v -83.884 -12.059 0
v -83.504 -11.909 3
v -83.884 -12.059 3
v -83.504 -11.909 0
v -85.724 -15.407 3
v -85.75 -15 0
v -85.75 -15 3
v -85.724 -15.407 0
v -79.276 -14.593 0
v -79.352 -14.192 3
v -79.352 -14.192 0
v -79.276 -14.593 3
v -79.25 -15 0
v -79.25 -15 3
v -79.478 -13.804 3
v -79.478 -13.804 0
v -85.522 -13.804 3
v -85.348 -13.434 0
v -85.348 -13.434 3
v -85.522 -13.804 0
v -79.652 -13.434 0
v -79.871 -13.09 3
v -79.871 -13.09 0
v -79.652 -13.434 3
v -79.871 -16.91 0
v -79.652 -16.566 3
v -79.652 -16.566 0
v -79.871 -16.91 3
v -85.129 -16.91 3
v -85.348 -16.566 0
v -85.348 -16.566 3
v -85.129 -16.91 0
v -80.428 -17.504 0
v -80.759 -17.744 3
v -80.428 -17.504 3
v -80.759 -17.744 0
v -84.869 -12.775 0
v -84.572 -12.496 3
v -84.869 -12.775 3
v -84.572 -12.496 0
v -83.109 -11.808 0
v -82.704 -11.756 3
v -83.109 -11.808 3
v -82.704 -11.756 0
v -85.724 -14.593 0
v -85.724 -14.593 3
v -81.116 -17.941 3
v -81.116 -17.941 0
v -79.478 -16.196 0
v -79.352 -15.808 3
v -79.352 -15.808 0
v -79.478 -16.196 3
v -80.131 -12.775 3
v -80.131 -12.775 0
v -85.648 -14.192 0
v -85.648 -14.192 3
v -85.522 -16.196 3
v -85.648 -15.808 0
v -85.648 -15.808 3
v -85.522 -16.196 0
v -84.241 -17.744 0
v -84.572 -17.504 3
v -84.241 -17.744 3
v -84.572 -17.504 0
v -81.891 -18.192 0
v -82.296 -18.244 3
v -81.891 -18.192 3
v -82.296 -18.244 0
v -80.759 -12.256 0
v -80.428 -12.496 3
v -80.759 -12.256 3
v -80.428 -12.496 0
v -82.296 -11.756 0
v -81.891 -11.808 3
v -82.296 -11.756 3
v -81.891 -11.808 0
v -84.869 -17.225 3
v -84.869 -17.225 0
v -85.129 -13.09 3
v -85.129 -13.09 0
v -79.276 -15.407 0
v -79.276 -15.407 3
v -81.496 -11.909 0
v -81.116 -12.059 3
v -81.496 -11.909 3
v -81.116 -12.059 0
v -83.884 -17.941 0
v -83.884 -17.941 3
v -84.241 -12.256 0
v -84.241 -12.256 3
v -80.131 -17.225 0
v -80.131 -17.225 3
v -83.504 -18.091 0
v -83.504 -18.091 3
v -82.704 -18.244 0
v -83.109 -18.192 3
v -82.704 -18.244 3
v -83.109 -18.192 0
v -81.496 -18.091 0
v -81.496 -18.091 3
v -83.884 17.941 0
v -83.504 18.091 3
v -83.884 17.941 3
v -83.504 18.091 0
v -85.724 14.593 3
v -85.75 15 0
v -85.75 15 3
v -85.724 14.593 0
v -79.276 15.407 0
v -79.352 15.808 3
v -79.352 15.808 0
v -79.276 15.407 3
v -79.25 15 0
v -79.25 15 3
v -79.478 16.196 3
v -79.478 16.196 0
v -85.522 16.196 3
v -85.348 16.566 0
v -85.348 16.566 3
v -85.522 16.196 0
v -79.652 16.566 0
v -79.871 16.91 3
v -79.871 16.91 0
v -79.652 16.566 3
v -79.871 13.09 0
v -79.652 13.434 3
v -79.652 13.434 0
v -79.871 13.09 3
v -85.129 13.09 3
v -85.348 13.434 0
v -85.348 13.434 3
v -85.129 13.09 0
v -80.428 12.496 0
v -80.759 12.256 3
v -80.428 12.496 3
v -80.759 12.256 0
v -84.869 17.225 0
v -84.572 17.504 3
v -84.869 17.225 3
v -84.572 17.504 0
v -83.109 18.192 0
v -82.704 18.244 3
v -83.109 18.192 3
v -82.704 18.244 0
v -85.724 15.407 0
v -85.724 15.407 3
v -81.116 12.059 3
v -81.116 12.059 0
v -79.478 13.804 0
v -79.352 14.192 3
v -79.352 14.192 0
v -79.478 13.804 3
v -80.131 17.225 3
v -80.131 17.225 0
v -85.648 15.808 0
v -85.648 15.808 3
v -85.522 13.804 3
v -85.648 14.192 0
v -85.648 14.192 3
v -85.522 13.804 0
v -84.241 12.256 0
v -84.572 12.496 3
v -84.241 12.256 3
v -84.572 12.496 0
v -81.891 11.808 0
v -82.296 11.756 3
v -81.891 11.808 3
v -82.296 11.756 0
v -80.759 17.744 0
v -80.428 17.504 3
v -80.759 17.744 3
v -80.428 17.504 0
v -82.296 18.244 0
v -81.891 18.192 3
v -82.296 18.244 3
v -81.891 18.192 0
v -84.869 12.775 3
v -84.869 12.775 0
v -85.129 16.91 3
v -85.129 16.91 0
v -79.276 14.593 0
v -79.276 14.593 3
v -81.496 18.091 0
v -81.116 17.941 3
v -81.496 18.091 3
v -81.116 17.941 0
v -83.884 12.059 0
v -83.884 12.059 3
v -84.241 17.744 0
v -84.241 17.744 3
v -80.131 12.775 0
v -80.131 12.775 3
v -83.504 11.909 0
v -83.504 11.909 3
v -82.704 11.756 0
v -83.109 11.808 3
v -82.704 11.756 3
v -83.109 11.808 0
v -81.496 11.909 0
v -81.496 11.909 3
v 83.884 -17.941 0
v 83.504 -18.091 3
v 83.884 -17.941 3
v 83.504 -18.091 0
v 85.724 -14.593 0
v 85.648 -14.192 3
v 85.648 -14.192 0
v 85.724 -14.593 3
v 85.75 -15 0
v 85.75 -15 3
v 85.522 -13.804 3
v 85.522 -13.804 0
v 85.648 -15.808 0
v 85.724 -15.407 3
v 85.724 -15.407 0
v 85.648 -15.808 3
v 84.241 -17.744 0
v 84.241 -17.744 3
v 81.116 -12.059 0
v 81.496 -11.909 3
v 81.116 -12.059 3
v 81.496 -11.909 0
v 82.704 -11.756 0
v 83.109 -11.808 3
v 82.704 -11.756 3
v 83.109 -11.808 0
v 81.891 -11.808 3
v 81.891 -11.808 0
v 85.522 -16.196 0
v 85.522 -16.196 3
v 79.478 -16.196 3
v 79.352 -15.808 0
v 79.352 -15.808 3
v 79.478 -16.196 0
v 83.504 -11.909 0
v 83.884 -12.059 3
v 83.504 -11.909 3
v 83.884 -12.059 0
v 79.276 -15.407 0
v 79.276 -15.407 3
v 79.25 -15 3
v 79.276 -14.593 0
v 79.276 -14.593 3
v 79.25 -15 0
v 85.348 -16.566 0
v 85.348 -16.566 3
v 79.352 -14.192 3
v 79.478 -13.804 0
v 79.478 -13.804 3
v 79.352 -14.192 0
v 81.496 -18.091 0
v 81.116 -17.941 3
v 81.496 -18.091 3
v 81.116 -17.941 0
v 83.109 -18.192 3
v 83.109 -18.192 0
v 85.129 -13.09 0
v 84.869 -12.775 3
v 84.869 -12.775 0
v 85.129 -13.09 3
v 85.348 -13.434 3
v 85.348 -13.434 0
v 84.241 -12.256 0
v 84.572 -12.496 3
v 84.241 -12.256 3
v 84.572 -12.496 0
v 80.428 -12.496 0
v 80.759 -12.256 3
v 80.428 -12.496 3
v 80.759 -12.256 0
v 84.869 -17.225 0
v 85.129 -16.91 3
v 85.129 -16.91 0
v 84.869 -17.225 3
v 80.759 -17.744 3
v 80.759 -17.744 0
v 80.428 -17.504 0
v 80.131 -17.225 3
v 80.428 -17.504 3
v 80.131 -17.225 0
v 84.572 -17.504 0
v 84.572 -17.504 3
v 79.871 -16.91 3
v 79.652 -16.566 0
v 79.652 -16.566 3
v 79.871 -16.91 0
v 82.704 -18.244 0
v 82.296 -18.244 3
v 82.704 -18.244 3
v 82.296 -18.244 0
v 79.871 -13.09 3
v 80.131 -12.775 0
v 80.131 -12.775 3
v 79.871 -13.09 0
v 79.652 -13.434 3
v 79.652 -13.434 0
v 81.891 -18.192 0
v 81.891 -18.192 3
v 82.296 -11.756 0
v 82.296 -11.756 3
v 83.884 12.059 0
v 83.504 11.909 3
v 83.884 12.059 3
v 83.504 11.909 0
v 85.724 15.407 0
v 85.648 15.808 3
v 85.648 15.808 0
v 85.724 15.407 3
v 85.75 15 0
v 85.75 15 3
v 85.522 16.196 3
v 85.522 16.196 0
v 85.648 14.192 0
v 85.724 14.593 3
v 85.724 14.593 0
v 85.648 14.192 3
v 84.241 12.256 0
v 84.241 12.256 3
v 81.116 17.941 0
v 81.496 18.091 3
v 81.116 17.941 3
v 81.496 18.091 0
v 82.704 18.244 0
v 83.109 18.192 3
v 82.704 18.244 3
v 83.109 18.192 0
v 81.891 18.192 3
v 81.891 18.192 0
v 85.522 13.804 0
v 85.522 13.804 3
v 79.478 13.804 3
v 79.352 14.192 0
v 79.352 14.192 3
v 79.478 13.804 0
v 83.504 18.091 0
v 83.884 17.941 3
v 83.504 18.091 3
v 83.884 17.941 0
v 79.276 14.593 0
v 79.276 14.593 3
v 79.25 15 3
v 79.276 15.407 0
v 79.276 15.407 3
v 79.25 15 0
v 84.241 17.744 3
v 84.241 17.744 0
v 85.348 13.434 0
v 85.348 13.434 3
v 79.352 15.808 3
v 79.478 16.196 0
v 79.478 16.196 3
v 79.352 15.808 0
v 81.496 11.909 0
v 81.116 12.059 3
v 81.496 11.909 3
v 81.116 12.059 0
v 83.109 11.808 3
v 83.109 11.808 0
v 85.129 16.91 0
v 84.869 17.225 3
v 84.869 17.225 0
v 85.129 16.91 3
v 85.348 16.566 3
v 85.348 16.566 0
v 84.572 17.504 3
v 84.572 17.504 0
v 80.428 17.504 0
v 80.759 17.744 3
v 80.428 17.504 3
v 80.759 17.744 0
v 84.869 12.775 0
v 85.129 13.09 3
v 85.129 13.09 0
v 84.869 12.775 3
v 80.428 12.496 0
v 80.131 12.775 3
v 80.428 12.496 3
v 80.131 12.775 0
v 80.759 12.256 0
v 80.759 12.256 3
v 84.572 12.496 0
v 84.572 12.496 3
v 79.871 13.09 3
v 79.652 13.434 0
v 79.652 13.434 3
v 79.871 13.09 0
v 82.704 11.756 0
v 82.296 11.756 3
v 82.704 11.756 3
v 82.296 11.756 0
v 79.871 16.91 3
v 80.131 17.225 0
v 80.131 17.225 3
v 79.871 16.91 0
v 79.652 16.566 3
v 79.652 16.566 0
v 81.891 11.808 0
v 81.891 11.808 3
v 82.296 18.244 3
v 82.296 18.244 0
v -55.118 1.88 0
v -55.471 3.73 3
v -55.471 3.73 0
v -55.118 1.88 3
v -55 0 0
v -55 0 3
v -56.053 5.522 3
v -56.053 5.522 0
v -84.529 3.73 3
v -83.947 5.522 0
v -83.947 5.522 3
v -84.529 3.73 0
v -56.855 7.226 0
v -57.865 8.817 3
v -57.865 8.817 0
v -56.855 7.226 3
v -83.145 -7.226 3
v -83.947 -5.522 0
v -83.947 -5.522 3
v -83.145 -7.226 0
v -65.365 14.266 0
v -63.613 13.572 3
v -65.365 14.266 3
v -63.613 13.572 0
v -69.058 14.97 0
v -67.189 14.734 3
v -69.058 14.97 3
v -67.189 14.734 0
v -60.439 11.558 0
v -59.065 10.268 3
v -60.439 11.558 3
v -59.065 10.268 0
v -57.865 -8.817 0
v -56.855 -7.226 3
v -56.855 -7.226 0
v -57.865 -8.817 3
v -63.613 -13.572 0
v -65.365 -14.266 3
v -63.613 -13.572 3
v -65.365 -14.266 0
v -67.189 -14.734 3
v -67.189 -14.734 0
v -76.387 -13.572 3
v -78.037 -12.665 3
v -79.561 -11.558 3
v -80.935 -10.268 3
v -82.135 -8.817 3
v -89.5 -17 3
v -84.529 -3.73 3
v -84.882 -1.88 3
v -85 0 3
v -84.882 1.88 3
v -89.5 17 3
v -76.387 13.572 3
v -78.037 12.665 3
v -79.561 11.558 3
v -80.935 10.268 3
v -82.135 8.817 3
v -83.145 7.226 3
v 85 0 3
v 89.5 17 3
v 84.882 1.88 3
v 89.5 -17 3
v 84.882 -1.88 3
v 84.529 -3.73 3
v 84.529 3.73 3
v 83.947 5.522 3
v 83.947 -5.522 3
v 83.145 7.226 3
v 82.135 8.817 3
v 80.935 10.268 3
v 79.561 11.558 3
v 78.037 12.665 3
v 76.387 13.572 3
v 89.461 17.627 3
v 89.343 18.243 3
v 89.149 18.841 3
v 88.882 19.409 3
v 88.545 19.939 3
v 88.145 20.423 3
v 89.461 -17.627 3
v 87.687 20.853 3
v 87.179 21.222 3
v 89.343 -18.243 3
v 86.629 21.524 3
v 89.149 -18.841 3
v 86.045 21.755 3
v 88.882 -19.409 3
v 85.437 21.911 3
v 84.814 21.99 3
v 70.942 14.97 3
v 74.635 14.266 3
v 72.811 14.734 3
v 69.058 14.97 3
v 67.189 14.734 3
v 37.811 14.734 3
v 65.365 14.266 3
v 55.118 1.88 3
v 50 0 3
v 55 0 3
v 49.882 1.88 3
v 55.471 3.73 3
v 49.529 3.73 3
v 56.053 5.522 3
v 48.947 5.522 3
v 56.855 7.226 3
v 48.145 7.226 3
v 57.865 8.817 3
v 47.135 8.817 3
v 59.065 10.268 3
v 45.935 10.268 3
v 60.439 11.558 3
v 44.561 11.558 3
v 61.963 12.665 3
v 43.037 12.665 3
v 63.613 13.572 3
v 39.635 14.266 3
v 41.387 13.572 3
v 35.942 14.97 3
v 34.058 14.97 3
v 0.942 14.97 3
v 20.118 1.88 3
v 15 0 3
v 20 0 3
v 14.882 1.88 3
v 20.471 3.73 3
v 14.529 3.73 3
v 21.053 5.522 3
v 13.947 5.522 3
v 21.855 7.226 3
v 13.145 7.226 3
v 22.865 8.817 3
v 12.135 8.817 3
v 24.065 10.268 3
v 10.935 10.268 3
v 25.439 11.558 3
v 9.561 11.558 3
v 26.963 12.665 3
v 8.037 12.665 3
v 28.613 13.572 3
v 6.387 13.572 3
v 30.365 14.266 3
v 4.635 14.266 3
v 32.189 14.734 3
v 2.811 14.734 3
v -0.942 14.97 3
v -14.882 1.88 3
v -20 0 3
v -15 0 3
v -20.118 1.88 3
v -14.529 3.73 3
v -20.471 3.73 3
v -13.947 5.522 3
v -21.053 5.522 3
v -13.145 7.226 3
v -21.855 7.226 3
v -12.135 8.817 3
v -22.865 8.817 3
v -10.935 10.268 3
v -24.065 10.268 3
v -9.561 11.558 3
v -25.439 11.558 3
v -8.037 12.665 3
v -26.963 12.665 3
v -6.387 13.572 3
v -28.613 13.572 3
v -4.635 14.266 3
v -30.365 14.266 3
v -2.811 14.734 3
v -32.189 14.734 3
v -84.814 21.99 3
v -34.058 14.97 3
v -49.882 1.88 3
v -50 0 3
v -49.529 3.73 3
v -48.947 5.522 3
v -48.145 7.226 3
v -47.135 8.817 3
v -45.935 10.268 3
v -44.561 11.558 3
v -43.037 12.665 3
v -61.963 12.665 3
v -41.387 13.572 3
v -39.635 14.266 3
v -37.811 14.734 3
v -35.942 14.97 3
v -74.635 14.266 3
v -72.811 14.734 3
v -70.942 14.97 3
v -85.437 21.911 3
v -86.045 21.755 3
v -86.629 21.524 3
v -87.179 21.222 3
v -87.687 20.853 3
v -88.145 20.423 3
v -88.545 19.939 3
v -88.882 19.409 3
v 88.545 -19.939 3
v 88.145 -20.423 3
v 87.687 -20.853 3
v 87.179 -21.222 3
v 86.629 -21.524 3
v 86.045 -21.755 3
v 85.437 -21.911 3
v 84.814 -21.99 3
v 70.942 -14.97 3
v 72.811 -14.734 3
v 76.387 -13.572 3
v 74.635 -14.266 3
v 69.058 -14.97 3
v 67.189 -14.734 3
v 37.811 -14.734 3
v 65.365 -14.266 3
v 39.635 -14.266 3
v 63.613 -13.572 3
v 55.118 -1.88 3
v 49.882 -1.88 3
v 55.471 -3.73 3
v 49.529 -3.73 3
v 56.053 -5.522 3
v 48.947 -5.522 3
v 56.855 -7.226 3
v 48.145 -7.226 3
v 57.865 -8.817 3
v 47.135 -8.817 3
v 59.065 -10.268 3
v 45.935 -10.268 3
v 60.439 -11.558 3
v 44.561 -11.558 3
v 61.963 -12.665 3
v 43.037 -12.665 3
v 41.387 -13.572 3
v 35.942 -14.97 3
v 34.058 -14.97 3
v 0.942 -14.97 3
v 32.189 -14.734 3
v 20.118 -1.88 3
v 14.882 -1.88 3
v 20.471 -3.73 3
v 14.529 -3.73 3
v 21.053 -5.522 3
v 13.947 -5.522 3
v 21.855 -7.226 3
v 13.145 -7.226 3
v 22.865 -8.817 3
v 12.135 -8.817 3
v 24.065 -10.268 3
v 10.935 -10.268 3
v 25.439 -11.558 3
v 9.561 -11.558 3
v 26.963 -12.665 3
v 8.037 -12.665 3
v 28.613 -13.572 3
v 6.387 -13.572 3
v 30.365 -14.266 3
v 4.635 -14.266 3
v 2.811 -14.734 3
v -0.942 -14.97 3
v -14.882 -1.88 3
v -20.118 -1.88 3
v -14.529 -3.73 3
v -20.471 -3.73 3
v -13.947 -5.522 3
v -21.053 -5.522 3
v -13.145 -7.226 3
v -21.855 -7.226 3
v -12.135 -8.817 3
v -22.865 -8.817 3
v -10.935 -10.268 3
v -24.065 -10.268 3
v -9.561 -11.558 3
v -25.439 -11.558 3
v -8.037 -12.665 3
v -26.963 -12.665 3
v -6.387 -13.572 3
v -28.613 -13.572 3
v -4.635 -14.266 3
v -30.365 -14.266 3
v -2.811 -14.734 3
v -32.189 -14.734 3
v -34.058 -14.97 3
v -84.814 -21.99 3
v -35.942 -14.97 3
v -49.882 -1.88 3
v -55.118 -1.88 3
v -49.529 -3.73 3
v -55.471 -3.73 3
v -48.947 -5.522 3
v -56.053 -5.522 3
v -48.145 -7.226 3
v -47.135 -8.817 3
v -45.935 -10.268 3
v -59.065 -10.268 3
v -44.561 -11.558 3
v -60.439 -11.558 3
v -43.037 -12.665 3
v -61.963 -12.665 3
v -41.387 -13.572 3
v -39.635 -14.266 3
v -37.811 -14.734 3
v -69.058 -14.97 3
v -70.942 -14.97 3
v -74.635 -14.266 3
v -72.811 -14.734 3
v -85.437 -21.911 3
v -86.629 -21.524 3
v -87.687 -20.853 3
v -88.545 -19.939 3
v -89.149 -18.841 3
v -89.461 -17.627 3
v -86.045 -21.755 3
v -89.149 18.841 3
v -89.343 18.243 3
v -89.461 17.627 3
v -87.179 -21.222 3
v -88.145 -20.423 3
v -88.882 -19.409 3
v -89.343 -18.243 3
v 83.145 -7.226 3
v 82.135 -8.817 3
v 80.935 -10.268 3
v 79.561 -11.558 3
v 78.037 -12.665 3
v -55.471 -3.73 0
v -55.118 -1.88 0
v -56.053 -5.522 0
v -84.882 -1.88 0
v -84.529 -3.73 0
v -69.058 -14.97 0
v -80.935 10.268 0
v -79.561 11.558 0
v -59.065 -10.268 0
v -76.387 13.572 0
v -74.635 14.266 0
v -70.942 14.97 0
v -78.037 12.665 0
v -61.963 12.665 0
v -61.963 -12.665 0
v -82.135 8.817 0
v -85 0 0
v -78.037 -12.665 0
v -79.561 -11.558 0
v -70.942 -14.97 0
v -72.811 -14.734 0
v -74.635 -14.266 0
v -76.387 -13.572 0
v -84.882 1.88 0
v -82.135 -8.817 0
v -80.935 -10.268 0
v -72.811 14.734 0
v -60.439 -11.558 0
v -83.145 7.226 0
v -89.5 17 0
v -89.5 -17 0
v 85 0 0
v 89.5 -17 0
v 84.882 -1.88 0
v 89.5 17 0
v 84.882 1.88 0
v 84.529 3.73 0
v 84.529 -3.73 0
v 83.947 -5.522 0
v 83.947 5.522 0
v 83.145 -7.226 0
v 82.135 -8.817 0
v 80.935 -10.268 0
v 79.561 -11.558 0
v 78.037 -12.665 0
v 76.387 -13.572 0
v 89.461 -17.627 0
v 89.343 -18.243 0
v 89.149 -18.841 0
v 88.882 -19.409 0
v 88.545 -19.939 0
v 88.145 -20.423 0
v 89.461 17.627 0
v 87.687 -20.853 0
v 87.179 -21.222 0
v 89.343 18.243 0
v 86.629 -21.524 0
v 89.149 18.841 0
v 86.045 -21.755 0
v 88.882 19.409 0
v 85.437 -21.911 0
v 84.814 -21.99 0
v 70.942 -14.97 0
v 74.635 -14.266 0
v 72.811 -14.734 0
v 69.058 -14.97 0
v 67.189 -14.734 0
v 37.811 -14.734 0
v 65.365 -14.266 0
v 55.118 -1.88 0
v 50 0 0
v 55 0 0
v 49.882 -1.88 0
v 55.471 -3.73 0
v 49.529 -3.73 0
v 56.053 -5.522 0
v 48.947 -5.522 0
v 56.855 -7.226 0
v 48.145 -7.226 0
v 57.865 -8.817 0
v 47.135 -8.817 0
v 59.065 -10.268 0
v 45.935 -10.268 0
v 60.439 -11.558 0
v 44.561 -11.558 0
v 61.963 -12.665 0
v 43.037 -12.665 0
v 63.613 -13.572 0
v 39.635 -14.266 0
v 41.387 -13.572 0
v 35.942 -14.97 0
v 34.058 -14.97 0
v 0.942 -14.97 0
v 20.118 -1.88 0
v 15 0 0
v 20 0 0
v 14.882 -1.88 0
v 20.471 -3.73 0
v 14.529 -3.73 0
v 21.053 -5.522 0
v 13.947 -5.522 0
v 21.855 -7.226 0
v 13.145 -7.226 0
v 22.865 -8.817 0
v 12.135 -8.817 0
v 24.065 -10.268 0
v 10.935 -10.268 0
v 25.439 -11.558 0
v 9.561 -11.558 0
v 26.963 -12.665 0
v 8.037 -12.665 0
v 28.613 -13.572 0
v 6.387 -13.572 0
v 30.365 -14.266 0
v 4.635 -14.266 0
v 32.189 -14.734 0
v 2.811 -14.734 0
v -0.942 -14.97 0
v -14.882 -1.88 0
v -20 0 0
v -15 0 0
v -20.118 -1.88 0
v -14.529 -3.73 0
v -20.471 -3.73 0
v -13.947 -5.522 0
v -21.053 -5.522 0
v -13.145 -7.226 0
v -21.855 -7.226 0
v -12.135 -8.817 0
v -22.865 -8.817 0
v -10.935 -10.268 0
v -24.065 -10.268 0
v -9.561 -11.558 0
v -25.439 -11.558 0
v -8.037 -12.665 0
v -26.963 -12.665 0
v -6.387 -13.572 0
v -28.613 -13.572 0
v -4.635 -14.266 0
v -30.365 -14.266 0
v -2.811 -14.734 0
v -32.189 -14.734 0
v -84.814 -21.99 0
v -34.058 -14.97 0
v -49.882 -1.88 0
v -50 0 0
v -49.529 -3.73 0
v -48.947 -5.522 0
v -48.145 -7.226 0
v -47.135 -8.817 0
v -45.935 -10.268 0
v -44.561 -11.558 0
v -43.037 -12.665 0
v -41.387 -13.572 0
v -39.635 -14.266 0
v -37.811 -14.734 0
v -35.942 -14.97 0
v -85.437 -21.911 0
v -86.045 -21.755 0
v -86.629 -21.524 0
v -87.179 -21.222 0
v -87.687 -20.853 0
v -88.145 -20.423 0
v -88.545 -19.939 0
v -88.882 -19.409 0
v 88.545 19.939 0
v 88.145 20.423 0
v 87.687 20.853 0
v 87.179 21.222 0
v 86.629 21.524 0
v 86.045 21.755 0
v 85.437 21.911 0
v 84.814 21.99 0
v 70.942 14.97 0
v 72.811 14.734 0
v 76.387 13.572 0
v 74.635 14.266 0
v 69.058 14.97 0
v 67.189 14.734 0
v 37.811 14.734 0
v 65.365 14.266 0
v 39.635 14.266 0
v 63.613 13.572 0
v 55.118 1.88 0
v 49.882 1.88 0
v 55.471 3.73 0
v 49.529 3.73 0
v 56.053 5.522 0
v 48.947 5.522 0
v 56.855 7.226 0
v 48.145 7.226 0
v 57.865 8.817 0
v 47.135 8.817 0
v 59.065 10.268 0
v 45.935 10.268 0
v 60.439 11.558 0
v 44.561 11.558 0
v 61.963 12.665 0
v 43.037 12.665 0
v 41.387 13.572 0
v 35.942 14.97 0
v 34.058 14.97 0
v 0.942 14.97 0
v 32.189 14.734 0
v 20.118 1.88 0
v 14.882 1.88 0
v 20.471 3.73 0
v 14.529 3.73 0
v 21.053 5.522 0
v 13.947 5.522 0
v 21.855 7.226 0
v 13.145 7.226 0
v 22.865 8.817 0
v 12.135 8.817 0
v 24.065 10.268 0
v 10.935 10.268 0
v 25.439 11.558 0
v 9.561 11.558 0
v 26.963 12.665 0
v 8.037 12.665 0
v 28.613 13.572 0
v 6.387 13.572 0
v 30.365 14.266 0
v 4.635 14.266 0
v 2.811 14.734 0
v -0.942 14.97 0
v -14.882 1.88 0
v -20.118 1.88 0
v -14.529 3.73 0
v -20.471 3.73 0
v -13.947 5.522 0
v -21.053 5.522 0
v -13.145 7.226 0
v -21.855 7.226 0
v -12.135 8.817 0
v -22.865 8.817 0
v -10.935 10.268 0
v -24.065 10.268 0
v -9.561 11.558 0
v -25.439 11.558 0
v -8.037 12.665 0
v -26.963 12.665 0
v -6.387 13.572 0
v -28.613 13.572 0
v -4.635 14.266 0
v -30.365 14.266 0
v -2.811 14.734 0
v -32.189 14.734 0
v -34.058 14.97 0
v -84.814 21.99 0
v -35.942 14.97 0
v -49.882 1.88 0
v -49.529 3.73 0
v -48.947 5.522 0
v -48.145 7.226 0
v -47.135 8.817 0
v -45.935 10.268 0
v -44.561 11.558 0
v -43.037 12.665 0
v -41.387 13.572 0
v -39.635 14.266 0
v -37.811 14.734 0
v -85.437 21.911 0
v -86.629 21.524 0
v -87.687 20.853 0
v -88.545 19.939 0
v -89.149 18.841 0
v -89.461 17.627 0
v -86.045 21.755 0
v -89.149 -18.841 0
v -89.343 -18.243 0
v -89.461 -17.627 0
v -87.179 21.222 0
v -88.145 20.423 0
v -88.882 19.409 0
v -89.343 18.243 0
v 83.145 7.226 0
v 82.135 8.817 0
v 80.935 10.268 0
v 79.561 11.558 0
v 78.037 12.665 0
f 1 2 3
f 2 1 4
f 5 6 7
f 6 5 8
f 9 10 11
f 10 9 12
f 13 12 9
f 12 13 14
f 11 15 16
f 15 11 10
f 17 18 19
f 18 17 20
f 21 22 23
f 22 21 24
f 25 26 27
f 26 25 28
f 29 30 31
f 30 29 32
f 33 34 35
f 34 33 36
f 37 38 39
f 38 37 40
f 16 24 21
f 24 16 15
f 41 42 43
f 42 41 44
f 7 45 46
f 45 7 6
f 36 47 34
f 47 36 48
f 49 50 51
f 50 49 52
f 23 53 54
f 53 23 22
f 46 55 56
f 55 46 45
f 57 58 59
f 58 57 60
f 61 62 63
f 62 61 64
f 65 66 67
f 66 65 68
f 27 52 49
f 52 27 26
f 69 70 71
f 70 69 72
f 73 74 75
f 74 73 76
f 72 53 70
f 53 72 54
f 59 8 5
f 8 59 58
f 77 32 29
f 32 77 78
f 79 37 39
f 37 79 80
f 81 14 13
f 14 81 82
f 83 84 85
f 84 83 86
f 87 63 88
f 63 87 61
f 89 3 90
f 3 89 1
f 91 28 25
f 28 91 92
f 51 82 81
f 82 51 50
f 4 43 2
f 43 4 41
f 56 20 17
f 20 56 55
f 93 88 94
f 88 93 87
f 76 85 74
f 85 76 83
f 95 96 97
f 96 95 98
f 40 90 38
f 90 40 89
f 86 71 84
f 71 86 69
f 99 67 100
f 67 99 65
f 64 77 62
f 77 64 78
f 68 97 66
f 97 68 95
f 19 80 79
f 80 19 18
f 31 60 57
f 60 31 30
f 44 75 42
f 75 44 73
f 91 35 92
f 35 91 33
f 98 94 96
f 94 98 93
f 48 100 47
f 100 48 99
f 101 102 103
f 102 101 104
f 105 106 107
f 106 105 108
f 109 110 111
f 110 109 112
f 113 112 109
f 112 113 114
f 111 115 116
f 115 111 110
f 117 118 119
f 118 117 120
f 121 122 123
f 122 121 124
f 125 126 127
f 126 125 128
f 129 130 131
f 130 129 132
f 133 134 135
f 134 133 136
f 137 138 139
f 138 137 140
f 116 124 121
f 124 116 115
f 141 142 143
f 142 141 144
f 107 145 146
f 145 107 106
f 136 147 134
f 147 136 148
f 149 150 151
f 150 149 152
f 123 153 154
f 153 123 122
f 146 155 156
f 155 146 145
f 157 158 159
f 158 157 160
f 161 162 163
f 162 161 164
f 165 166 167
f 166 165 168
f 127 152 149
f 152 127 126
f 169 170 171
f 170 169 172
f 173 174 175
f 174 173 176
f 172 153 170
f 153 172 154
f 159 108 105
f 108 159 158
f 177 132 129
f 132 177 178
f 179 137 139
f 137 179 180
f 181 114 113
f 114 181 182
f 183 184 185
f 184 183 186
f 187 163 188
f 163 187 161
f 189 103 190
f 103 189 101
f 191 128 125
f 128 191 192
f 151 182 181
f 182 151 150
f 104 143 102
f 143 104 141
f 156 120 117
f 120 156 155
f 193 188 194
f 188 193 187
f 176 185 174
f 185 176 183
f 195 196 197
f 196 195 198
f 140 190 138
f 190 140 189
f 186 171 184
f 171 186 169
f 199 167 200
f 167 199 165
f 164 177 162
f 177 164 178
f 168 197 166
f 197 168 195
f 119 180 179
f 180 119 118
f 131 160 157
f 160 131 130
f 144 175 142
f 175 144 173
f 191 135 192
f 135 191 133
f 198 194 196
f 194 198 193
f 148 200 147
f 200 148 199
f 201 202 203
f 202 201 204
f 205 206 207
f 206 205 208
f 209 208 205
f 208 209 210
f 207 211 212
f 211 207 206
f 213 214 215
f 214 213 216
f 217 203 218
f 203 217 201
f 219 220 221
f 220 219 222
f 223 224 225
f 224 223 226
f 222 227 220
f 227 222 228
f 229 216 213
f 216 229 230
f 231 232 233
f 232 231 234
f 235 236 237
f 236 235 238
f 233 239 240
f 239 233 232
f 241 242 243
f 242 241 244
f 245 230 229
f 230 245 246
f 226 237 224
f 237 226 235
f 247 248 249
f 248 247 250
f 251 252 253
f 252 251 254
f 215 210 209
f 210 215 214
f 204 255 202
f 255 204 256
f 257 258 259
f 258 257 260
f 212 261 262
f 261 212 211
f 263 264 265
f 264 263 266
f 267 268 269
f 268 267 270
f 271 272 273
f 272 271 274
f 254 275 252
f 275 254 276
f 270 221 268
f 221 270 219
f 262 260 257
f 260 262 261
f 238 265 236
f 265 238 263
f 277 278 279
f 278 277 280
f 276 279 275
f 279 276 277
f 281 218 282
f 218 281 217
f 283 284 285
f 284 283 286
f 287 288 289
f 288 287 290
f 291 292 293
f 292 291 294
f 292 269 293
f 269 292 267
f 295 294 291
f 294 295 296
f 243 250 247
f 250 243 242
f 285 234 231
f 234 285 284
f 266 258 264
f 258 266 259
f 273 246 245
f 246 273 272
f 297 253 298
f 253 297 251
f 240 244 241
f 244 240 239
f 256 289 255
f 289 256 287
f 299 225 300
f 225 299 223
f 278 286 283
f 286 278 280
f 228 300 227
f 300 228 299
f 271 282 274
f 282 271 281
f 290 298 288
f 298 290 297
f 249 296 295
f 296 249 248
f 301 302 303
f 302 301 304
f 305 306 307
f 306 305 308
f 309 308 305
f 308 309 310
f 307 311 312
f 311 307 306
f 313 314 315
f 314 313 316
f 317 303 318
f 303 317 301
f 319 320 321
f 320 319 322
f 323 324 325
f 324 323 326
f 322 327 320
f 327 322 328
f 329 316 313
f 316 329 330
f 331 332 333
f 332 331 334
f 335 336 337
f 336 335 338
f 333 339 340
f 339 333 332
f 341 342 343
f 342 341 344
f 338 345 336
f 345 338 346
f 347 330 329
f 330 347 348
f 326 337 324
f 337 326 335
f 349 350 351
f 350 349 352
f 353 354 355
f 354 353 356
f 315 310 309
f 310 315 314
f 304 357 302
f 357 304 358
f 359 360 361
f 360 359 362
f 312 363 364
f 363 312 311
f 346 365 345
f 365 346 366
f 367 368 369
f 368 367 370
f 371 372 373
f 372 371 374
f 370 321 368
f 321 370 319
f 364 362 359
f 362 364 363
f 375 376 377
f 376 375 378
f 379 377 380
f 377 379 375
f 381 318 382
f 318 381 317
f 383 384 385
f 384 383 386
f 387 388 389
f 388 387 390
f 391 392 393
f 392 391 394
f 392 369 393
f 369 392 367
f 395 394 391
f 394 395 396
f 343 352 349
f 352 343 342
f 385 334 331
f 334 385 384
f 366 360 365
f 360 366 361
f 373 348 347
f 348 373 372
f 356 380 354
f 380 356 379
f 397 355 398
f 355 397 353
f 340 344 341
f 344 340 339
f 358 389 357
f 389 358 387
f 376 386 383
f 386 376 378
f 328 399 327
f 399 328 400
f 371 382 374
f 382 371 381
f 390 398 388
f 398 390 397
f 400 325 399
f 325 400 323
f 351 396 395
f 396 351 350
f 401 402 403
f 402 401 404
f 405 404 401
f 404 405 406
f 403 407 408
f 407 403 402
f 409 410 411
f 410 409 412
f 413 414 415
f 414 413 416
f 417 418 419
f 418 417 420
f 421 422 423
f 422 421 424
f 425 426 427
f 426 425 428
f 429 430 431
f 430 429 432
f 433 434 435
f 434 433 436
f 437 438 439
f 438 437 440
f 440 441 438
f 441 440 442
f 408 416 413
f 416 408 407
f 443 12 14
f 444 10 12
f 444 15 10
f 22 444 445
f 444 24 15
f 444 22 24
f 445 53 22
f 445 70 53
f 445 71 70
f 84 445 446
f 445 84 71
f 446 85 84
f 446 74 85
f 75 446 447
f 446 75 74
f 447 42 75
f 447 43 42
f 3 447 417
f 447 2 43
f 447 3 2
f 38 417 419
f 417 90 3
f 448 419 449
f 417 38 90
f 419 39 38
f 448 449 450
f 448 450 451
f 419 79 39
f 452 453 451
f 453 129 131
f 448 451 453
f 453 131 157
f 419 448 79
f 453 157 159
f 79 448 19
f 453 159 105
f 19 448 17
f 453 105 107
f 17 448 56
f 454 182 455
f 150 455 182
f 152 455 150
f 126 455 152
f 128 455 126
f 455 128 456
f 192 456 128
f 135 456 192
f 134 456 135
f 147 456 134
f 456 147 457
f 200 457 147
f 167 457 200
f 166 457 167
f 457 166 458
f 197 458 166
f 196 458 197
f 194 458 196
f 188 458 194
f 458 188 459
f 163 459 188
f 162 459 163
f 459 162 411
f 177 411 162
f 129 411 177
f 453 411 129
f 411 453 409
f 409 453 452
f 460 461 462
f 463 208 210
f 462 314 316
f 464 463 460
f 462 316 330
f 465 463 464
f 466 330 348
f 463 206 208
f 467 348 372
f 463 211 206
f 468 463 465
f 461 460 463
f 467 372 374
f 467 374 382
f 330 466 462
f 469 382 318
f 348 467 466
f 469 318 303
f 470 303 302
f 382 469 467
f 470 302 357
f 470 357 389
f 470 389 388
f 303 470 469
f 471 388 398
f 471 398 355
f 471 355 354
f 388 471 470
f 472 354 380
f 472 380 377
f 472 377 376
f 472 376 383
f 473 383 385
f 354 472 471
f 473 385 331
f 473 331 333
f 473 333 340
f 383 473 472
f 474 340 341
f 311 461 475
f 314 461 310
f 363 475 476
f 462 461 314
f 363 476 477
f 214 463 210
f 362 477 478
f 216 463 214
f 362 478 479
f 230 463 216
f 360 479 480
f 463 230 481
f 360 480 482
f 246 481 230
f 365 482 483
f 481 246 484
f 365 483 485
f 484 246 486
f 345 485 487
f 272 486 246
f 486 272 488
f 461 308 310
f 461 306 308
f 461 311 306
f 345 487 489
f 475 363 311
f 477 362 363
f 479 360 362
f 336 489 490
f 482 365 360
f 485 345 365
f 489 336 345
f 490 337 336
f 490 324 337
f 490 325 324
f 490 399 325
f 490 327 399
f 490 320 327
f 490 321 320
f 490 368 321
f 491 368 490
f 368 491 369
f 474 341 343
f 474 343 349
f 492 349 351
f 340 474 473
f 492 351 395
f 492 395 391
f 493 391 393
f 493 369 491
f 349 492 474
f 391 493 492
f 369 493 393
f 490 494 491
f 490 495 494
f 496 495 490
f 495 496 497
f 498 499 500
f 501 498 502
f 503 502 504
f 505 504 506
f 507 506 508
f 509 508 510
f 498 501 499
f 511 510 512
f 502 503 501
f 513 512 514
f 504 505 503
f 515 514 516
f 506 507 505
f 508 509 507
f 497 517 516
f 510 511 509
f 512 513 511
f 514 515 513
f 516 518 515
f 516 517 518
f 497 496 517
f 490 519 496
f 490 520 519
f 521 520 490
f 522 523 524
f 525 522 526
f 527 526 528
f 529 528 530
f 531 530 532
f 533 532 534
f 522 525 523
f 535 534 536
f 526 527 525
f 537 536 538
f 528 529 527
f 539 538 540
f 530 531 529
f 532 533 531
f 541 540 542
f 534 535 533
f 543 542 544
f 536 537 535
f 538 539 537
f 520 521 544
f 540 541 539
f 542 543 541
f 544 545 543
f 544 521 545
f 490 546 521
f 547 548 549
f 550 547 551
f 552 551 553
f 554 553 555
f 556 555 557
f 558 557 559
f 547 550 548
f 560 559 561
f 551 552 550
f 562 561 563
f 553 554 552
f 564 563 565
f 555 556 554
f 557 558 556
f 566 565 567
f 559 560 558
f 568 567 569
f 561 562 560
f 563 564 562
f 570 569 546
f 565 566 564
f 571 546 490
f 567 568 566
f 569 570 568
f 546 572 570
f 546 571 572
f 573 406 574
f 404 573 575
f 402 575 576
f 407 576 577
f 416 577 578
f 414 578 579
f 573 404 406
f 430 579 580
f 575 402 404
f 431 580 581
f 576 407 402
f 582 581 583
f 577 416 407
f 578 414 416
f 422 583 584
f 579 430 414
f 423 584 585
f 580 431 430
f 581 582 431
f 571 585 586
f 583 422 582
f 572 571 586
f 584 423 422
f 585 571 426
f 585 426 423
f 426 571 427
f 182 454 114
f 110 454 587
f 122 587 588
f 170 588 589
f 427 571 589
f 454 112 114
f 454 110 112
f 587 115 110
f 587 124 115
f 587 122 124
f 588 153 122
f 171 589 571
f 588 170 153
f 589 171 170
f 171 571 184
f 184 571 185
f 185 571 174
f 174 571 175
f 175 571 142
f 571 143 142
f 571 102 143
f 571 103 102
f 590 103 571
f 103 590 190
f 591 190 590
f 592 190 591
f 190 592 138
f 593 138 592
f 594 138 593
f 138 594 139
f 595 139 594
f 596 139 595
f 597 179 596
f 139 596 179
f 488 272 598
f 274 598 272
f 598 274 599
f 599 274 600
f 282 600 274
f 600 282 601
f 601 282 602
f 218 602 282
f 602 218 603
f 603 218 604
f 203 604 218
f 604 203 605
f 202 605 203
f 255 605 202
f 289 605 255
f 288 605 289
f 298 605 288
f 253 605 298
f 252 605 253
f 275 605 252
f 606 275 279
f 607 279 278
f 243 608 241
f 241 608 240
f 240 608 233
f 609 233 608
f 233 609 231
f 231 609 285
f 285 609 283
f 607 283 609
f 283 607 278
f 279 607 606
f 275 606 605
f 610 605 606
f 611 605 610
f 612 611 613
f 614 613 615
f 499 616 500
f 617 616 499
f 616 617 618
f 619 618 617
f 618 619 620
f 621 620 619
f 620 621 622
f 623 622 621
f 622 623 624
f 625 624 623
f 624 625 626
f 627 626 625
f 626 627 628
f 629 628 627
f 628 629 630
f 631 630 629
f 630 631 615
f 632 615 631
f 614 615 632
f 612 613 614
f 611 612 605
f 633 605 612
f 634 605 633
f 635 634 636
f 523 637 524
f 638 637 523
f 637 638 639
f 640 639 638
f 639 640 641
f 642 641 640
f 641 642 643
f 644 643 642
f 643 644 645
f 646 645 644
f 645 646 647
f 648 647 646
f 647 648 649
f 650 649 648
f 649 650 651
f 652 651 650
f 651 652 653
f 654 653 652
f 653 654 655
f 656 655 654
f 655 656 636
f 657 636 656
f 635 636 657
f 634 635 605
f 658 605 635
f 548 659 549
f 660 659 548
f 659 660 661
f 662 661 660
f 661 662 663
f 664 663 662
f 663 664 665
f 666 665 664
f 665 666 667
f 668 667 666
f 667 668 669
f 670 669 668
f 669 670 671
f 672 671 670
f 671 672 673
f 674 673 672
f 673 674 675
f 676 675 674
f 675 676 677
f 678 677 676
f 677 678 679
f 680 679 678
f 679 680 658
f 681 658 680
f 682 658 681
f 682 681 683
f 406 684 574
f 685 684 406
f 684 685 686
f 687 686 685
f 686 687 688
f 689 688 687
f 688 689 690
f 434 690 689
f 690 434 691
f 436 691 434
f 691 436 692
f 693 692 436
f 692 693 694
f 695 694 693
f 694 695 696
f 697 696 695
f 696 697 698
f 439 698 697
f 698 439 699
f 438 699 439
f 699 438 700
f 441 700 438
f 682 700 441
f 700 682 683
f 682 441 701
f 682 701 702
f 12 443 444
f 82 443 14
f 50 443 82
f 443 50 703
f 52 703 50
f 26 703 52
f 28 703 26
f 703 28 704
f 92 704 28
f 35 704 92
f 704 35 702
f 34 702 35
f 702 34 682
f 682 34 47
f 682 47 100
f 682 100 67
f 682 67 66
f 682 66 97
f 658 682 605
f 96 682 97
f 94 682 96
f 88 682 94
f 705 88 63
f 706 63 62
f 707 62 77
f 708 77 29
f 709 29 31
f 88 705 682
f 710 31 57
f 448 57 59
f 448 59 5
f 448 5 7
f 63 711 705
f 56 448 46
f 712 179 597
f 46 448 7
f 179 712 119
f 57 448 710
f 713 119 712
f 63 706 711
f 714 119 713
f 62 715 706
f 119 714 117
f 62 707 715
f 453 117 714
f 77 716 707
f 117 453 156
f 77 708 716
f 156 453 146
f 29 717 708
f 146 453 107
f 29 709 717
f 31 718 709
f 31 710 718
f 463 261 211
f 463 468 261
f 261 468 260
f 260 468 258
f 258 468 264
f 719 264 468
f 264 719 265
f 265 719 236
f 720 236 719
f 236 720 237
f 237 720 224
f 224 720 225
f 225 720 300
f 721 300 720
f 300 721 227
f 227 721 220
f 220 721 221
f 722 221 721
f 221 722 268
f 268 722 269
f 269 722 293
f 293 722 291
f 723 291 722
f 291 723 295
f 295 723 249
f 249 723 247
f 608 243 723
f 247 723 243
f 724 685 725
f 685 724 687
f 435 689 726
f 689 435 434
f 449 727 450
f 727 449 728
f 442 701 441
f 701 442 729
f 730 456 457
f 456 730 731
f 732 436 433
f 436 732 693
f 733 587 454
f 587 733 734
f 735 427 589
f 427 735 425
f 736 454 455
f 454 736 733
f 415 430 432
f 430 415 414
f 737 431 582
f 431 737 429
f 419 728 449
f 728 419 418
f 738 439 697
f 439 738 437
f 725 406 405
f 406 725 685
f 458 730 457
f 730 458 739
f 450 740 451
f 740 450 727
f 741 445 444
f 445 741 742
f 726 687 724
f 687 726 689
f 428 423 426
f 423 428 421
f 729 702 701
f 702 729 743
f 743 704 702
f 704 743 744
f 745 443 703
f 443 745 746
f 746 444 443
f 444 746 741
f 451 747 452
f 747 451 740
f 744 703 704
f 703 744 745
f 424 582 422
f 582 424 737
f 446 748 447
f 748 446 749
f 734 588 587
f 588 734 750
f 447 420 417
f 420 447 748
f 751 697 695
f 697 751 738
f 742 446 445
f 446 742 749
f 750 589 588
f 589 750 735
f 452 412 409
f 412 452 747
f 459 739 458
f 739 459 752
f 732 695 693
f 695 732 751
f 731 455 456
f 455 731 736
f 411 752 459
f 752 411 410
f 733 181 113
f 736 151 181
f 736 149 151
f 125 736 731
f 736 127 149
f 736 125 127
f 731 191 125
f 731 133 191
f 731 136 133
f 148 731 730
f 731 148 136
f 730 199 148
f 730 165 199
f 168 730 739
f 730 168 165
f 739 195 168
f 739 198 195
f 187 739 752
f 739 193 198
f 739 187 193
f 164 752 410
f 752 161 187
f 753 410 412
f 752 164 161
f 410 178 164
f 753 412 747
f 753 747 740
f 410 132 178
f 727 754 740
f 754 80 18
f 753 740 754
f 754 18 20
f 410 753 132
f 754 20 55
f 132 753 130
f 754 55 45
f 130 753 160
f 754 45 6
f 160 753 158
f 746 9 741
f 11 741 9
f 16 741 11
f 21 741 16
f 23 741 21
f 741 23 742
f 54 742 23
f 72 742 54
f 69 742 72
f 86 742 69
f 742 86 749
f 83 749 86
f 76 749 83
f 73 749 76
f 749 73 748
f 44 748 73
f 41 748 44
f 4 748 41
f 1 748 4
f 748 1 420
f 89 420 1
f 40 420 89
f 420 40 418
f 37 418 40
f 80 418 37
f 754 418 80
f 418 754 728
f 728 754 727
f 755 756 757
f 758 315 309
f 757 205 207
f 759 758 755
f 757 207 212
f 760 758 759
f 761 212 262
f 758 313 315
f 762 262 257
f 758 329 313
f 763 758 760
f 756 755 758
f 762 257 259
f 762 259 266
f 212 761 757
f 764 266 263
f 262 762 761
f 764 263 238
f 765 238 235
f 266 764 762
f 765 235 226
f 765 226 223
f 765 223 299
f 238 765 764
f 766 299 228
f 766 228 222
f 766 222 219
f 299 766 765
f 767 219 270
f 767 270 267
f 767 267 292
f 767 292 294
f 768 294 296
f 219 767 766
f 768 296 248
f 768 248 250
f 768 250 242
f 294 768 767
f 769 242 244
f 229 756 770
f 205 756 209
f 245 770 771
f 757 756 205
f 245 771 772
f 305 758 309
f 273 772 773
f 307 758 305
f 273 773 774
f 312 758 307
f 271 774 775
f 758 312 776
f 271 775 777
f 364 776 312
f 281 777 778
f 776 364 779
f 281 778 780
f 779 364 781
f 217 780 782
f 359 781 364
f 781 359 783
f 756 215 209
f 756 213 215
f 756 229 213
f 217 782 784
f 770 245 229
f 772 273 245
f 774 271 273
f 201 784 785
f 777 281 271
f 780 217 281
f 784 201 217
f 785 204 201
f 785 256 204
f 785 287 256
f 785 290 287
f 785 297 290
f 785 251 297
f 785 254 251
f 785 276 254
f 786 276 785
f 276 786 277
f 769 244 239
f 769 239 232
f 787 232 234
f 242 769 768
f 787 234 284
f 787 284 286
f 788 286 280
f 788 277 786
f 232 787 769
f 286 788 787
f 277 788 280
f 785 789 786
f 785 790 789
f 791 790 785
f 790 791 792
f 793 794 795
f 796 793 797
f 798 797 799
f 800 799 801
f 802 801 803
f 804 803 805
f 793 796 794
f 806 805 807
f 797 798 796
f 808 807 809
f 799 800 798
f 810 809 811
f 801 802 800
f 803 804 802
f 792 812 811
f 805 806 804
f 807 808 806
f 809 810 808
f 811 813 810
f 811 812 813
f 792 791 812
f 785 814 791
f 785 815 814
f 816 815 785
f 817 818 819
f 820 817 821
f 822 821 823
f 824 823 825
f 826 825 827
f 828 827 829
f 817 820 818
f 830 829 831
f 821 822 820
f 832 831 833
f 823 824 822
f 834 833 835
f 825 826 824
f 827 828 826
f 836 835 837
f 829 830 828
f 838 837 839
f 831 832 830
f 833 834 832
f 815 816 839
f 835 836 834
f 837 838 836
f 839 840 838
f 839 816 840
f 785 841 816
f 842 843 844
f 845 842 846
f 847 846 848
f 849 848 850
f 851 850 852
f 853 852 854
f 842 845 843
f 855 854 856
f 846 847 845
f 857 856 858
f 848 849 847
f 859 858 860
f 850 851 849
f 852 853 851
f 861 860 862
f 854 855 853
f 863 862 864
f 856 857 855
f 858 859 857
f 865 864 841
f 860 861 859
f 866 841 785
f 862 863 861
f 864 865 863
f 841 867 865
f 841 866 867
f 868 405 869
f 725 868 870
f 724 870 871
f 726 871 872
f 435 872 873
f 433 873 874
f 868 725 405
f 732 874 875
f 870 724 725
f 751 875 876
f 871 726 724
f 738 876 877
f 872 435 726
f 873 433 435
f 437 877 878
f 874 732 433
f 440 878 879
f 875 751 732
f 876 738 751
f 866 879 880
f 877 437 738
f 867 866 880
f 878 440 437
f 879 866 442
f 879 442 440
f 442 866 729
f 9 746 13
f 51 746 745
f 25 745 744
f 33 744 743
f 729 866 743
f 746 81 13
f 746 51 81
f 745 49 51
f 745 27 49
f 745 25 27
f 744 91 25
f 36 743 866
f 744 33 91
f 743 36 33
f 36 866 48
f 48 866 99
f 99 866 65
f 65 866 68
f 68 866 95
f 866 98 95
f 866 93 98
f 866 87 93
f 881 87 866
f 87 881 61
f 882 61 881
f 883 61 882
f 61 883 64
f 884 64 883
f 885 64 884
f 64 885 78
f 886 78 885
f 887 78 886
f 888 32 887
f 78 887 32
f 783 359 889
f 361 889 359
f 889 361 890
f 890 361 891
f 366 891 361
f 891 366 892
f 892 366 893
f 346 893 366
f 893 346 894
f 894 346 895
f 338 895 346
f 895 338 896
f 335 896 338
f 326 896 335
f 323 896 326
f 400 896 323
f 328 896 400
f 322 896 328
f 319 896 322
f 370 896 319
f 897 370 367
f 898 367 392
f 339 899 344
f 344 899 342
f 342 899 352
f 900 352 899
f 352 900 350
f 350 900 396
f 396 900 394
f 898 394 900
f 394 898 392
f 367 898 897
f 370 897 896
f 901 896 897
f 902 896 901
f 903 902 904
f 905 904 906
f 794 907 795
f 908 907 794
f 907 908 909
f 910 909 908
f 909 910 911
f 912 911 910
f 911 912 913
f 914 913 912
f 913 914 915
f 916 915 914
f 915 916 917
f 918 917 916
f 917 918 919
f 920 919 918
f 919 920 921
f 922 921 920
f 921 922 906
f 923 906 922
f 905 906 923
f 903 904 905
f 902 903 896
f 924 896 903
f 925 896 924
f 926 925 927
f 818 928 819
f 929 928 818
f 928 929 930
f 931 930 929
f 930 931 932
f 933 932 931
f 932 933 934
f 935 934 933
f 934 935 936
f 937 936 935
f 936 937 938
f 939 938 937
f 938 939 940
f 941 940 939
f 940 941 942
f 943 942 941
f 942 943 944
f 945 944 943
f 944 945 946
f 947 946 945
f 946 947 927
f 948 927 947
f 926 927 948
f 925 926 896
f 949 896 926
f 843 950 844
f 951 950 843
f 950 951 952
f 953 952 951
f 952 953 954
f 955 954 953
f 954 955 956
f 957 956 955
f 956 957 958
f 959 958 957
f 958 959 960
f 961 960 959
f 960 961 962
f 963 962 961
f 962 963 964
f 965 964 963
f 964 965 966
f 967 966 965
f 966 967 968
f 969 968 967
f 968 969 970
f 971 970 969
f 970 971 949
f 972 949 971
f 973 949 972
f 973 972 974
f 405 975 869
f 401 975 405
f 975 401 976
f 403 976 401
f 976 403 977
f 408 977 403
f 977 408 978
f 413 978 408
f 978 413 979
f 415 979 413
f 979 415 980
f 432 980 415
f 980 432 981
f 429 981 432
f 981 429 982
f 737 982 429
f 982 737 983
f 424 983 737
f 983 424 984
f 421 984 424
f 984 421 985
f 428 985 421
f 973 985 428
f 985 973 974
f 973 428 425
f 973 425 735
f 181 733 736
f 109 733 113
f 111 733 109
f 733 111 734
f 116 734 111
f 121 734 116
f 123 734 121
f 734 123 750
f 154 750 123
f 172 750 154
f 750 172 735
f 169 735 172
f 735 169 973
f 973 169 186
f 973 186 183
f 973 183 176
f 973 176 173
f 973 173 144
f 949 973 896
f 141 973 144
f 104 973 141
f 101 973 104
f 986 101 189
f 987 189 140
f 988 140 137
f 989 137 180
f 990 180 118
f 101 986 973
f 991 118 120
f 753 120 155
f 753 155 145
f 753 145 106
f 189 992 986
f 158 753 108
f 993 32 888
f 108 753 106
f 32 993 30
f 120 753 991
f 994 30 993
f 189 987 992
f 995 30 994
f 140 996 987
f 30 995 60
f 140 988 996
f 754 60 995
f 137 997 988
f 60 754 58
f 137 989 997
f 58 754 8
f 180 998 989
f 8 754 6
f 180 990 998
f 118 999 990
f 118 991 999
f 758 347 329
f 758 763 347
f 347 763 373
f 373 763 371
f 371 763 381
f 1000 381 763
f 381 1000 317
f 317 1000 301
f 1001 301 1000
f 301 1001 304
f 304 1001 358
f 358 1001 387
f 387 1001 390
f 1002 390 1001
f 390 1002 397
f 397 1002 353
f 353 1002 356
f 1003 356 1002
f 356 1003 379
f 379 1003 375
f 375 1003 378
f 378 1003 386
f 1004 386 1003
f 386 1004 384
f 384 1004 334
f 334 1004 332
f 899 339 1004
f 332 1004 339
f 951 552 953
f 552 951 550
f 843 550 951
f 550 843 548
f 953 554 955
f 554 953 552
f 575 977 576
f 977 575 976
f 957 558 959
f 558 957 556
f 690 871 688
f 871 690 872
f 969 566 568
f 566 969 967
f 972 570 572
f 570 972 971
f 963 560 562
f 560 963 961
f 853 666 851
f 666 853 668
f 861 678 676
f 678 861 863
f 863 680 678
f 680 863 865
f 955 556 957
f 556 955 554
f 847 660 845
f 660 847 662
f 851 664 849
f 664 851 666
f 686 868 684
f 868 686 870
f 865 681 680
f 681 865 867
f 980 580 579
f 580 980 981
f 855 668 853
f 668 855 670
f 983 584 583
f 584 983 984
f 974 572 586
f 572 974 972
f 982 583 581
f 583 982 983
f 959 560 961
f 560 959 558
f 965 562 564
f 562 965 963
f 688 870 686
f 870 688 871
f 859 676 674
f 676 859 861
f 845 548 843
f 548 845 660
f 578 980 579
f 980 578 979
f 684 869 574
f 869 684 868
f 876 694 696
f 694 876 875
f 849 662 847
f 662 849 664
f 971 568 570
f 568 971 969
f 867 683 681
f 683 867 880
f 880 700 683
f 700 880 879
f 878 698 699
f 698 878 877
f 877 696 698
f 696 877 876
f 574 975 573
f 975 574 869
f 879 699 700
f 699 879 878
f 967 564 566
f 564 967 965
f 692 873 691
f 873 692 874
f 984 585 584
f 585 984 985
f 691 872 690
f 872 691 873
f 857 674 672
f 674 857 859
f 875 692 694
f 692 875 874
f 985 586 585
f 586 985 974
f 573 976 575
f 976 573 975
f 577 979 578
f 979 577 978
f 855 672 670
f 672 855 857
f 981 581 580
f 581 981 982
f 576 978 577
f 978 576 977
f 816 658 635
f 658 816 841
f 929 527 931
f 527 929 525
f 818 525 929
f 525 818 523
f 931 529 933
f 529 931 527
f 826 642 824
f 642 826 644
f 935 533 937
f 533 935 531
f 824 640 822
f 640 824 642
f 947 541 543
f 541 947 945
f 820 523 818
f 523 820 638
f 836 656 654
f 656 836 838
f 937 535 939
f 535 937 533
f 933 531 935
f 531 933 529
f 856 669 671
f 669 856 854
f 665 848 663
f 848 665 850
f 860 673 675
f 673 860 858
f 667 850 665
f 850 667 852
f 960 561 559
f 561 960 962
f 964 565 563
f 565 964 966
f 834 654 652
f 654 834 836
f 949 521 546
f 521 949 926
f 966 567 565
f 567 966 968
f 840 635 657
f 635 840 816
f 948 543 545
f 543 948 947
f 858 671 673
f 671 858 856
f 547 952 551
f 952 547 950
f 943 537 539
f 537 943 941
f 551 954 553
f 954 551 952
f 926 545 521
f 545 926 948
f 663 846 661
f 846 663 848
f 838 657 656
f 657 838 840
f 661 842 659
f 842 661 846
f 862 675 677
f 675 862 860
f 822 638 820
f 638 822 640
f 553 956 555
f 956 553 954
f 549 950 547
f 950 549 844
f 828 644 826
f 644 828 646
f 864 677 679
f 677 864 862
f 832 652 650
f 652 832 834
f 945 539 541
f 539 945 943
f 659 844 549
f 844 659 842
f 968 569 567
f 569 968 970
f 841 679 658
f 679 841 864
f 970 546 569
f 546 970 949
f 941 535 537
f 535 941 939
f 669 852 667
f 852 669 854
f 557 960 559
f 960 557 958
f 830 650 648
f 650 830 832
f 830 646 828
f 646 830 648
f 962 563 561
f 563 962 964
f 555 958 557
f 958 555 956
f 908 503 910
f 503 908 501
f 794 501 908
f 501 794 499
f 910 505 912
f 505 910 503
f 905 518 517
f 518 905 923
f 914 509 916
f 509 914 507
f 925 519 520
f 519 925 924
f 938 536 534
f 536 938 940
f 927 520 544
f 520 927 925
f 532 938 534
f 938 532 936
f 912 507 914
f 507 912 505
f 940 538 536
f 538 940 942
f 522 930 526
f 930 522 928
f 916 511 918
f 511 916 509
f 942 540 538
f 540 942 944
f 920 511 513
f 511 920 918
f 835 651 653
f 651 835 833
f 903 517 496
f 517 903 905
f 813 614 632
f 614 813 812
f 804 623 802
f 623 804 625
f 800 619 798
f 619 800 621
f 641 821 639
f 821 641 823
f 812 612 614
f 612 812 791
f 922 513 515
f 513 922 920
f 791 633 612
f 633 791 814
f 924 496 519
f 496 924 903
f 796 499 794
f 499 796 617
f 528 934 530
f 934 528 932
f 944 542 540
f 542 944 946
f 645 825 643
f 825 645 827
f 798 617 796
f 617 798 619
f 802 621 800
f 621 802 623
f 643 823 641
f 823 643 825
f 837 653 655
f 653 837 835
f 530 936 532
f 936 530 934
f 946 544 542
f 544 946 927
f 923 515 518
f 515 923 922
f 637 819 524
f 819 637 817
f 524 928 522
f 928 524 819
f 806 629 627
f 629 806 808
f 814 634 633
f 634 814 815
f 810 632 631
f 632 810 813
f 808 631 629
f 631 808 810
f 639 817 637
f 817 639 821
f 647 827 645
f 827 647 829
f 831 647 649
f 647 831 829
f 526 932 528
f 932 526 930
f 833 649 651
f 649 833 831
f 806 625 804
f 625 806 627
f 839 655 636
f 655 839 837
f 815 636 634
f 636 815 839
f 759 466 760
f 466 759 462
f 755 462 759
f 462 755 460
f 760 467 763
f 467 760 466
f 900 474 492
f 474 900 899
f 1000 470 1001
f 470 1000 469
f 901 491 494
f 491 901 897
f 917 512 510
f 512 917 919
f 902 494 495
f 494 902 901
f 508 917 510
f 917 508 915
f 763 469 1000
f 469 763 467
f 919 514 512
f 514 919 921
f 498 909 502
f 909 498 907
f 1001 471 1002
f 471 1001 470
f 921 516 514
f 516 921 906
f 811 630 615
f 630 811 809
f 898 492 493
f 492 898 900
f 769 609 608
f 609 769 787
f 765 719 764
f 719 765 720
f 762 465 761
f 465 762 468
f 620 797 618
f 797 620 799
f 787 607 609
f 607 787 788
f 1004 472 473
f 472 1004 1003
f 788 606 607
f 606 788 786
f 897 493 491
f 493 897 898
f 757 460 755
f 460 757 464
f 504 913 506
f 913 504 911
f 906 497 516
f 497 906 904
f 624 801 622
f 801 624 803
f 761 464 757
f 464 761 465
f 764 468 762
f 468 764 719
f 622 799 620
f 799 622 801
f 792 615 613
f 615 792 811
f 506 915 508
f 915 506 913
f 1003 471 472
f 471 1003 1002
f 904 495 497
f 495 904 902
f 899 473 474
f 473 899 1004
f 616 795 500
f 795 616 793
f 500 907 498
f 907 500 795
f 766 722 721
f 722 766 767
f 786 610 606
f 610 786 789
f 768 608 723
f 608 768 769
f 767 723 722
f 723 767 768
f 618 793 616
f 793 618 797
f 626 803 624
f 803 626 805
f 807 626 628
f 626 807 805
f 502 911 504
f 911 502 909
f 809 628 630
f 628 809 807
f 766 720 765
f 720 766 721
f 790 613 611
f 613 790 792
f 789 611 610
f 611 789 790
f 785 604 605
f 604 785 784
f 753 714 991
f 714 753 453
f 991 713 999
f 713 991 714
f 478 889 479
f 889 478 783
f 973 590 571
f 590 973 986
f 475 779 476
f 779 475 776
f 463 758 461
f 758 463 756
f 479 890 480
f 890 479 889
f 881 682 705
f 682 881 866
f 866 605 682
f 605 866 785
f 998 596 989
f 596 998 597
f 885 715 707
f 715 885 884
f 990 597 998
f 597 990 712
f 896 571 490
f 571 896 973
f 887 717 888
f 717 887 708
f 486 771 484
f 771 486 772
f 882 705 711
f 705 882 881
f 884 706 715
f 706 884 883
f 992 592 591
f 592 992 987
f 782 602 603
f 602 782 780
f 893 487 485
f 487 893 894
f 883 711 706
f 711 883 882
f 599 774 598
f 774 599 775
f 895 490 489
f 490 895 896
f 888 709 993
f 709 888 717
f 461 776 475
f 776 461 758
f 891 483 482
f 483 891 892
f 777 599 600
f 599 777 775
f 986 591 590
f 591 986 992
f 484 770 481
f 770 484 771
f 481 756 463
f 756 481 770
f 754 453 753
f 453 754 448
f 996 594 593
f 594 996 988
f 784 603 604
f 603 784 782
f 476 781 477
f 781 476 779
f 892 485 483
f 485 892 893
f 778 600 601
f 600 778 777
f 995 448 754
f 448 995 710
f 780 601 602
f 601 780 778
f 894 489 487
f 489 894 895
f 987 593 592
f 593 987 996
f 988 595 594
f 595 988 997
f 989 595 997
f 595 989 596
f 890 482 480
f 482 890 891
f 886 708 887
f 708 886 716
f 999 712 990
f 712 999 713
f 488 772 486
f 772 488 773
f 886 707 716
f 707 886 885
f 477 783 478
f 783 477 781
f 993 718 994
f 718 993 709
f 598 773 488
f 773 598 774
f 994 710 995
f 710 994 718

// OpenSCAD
$fn = 50;


difference() {
	union() {
		hull() {
			translate(v = [-84.5000000000, 17.0000000000, 0]) {
				cylinder(h = 3, r = 5);
			}
			translate(v = [84.5000000000, 17.0000000000, 0]) {
				cylinder(h = 3, r = 5);
			}
			translate(v = [-84.5000000000, -17.0000000000, 0]) {
				cylinder(h = 3, r = 5);
			}
			translate(v = [84.5000000000, -17.0000000000, 0]) {
				cylinder(h = 3, r = 5);
			}
		}
	}
	union() {
		#translate(v = [-82.5000000000, -15.0000000000, -100.0000000000]) {
			cylinder(h = 200, r = 3.2500000000);
		}
		#translate(v = [-82.5000000000, 15.0000000000, -100.0000000000]) {
			cylinder(h = 200, r = 3.2500000000);
		}
		#translate(v = [82.5000000000, -15.0000000000, -100.0000000000]) {
			cylinder(h = 200, r = 3.2500000000);
		}
		#translate(v = [82.5000000000, 15.0000000000, -100.0000000000]) {
			cylinder(h = 200, r = 3.2500000000);
		}
		#translate(v = [-70.0000000000, 0, 0]) {
			cylinder(h = 3, r = 15.0000000000);
		}
		#translate(v = [-35.0000000000, 0, 0]) {
			cylinder(h = 3, r = 15.0000000000);
		}
		#cylinder(h = 3, r = 15.0000000000);
		#translate(v = [35.0000000000, 0, 0]) {
			cylinder(h = 3, r = 15.0000000000);
		}
		#translate(v = [70.0000000000, 0, 0]) {
			cylinder(h = 3, r = 15.0000000000);
		}
	}
}
